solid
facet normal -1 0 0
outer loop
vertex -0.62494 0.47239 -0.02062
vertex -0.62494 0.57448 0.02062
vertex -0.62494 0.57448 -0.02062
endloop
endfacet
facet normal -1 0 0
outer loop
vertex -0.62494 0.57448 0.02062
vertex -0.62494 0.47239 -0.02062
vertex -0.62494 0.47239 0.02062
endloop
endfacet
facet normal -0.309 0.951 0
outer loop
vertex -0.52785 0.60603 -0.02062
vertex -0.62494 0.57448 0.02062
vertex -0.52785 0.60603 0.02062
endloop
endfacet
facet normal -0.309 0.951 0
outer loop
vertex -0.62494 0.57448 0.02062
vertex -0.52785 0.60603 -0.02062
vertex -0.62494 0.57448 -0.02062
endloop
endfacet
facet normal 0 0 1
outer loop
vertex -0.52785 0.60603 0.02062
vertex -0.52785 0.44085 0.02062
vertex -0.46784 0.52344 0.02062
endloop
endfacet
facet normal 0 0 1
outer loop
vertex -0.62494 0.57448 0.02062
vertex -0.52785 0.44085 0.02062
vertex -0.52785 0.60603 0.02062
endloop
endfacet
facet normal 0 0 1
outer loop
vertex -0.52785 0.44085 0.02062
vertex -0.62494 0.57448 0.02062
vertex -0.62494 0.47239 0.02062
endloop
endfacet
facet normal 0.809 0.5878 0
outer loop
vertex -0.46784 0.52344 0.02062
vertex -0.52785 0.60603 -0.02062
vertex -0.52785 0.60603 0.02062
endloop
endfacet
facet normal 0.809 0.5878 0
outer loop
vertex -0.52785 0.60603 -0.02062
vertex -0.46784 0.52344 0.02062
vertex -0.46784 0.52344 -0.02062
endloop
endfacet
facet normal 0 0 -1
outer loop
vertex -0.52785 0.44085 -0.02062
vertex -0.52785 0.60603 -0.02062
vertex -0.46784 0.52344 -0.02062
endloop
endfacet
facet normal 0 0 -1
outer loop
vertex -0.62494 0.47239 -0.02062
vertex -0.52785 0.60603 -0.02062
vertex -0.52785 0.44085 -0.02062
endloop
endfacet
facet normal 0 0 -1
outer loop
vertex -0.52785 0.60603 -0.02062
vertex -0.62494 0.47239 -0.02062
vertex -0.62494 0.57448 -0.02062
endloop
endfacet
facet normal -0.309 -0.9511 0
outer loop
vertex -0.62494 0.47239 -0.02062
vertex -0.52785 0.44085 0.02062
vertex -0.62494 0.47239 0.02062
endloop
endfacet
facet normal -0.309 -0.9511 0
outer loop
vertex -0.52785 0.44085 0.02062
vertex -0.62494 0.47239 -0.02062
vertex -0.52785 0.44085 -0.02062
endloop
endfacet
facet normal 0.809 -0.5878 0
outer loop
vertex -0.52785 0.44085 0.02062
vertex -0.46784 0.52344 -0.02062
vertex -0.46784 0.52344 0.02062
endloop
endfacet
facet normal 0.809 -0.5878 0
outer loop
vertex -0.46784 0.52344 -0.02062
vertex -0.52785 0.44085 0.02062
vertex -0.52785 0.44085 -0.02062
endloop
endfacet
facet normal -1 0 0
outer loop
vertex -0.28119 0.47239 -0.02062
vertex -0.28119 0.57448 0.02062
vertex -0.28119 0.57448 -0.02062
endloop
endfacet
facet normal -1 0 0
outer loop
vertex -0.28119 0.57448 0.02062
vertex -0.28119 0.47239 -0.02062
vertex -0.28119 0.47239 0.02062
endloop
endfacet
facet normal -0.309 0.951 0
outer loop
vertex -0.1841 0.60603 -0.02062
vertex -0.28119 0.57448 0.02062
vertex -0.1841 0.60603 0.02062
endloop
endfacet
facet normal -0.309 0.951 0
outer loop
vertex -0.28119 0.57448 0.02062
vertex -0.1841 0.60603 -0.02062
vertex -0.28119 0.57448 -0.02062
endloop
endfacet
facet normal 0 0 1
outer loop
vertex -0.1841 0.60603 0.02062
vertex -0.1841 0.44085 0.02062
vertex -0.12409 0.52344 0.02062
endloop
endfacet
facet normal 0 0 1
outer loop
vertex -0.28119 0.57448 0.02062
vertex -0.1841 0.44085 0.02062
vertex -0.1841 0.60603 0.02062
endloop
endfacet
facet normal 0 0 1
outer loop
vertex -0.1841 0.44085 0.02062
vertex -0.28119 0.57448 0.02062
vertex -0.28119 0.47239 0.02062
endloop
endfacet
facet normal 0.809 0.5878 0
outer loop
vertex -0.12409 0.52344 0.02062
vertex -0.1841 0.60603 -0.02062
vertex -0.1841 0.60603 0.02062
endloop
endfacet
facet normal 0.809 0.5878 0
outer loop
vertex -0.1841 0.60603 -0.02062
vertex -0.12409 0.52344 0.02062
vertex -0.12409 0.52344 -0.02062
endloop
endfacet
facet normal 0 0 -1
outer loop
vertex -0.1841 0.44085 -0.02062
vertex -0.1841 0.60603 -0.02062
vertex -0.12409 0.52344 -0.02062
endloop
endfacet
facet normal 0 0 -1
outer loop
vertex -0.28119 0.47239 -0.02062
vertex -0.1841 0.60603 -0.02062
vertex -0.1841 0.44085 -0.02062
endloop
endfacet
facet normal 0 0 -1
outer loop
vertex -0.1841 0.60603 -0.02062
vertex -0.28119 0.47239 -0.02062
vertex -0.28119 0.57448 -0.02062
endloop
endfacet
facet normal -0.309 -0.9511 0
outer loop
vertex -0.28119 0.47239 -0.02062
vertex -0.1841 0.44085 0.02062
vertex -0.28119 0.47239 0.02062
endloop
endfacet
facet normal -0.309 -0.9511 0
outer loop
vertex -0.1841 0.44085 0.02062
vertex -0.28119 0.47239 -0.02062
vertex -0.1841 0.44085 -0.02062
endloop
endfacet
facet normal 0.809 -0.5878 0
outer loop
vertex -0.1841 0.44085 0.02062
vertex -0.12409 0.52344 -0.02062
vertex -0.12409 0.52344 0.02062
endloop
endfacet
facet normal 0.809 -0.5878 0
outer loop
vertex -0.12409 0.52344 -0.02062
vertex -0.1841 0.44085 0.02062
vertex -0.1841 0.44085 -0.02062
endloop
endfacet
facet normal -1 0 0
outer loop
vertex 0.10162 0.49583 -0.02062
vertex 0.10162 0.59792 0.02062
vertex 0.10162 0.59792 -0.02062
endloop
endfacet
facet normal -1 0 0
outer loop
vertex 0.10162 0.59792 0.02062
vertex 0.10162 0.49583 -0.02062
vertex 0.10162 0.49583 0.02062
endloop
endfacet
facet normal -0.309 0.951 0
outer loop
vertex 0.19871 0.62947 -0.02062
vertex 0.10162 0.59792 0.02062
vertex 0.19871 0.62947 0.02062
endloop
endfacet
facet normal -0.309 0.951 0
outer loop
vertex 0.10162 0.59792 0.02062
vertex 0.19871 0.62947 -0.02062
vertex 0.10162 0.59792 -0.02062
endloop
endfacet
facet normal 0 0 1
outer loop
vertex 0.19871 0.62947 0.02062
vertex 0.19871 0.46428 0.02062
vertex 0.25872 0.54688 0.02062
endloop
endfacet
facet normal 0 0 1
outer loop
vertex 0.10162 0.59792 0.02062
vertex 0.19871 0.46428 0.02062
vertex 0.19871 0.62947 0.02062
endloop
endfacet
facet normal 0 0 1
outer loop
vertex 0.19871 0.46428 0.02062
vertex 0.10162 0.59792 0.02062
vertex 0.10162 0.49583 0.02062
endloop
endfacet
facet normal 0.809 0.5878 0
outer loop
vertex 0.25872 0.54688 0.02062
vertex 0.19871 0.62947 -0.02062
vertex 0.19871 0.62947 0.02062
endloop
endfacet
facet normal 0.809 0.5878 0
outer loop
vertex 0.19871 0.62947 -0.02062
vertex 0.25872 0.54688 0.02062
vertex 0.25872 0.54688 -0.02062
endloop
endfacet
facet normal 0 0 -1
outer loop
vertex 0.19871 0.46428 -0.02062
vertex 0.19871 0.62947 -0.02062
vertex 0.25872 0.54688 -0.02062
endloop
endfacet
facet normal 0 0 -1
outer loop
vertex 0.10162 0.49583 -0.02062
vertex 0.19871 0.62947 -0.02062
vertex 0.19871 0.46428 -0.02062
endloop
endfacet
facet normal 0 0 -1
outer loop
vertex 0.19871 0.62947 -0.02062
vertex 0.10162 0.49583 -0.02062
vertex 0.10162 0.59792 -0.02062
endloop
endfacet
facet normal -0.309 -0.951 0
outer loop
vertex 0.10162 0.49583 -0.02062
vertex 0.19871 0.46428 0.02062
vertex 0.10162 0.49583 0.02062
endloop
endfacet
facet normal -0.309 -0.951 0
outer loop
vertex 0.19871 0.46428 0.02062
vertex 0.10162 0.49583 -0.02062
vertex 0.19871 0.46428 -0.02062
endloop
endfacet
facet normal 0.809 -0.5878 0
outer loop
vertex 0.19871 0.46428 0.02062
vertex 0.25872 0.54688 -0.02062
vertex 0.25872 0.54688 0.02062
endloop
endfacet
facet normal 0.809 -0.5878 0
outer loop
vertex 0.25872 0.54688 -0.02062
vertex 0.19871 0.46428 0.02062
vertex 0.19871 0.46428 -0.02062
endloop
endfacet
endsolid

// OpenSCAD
EPS = 0.01;

module circle_extrude(radius, height) {
    translate([0, 0, -height/2])
        linear_extrude(height=height)
            circle(r=radius);
}

module rectangle_with_circle_extrude(x, y, circle_radius, height) {
    translate([0, 0, -height/2])
        difference() {
            square([x, y]);
            translate([x/2, y/2])
                circle(r=circle_radius);
        }
    linear_extrude(height=height);
}

union() {
    translate([-0.5546875, 0.5234375, 0])
        circle_extrude(0.08684210526315789, 0.03125 + EPS);
    translate([-0.2109375, 0.5234375, 0])
        circle_extrude(0.08684210526315789, 0.03125 + EPS);
    translate([0.171875, 0.546875, 0])
        circle_extrude(0.08684210526315789, 0.03125 + EPS);
    translate([-0.5703125, 0.421875, 0])
        rectangle_with_circle_extrude(0.203125, 0.203125, 0.08552631578947369, 0.046875 + EPS);
    translate([-0.21875, 0.3203125, 0])
        rectangle_with_circle_extrude(0.20526315789473687, 0.40625, 0.08552631578947369, 0.046875 + EPS);
    translate([0.0625, 0.34375, 0])
        rectangle_with_circle_extrude(0.40625, 0.40625, 0.08552631578947369, 0.046875 + EPS);
}
